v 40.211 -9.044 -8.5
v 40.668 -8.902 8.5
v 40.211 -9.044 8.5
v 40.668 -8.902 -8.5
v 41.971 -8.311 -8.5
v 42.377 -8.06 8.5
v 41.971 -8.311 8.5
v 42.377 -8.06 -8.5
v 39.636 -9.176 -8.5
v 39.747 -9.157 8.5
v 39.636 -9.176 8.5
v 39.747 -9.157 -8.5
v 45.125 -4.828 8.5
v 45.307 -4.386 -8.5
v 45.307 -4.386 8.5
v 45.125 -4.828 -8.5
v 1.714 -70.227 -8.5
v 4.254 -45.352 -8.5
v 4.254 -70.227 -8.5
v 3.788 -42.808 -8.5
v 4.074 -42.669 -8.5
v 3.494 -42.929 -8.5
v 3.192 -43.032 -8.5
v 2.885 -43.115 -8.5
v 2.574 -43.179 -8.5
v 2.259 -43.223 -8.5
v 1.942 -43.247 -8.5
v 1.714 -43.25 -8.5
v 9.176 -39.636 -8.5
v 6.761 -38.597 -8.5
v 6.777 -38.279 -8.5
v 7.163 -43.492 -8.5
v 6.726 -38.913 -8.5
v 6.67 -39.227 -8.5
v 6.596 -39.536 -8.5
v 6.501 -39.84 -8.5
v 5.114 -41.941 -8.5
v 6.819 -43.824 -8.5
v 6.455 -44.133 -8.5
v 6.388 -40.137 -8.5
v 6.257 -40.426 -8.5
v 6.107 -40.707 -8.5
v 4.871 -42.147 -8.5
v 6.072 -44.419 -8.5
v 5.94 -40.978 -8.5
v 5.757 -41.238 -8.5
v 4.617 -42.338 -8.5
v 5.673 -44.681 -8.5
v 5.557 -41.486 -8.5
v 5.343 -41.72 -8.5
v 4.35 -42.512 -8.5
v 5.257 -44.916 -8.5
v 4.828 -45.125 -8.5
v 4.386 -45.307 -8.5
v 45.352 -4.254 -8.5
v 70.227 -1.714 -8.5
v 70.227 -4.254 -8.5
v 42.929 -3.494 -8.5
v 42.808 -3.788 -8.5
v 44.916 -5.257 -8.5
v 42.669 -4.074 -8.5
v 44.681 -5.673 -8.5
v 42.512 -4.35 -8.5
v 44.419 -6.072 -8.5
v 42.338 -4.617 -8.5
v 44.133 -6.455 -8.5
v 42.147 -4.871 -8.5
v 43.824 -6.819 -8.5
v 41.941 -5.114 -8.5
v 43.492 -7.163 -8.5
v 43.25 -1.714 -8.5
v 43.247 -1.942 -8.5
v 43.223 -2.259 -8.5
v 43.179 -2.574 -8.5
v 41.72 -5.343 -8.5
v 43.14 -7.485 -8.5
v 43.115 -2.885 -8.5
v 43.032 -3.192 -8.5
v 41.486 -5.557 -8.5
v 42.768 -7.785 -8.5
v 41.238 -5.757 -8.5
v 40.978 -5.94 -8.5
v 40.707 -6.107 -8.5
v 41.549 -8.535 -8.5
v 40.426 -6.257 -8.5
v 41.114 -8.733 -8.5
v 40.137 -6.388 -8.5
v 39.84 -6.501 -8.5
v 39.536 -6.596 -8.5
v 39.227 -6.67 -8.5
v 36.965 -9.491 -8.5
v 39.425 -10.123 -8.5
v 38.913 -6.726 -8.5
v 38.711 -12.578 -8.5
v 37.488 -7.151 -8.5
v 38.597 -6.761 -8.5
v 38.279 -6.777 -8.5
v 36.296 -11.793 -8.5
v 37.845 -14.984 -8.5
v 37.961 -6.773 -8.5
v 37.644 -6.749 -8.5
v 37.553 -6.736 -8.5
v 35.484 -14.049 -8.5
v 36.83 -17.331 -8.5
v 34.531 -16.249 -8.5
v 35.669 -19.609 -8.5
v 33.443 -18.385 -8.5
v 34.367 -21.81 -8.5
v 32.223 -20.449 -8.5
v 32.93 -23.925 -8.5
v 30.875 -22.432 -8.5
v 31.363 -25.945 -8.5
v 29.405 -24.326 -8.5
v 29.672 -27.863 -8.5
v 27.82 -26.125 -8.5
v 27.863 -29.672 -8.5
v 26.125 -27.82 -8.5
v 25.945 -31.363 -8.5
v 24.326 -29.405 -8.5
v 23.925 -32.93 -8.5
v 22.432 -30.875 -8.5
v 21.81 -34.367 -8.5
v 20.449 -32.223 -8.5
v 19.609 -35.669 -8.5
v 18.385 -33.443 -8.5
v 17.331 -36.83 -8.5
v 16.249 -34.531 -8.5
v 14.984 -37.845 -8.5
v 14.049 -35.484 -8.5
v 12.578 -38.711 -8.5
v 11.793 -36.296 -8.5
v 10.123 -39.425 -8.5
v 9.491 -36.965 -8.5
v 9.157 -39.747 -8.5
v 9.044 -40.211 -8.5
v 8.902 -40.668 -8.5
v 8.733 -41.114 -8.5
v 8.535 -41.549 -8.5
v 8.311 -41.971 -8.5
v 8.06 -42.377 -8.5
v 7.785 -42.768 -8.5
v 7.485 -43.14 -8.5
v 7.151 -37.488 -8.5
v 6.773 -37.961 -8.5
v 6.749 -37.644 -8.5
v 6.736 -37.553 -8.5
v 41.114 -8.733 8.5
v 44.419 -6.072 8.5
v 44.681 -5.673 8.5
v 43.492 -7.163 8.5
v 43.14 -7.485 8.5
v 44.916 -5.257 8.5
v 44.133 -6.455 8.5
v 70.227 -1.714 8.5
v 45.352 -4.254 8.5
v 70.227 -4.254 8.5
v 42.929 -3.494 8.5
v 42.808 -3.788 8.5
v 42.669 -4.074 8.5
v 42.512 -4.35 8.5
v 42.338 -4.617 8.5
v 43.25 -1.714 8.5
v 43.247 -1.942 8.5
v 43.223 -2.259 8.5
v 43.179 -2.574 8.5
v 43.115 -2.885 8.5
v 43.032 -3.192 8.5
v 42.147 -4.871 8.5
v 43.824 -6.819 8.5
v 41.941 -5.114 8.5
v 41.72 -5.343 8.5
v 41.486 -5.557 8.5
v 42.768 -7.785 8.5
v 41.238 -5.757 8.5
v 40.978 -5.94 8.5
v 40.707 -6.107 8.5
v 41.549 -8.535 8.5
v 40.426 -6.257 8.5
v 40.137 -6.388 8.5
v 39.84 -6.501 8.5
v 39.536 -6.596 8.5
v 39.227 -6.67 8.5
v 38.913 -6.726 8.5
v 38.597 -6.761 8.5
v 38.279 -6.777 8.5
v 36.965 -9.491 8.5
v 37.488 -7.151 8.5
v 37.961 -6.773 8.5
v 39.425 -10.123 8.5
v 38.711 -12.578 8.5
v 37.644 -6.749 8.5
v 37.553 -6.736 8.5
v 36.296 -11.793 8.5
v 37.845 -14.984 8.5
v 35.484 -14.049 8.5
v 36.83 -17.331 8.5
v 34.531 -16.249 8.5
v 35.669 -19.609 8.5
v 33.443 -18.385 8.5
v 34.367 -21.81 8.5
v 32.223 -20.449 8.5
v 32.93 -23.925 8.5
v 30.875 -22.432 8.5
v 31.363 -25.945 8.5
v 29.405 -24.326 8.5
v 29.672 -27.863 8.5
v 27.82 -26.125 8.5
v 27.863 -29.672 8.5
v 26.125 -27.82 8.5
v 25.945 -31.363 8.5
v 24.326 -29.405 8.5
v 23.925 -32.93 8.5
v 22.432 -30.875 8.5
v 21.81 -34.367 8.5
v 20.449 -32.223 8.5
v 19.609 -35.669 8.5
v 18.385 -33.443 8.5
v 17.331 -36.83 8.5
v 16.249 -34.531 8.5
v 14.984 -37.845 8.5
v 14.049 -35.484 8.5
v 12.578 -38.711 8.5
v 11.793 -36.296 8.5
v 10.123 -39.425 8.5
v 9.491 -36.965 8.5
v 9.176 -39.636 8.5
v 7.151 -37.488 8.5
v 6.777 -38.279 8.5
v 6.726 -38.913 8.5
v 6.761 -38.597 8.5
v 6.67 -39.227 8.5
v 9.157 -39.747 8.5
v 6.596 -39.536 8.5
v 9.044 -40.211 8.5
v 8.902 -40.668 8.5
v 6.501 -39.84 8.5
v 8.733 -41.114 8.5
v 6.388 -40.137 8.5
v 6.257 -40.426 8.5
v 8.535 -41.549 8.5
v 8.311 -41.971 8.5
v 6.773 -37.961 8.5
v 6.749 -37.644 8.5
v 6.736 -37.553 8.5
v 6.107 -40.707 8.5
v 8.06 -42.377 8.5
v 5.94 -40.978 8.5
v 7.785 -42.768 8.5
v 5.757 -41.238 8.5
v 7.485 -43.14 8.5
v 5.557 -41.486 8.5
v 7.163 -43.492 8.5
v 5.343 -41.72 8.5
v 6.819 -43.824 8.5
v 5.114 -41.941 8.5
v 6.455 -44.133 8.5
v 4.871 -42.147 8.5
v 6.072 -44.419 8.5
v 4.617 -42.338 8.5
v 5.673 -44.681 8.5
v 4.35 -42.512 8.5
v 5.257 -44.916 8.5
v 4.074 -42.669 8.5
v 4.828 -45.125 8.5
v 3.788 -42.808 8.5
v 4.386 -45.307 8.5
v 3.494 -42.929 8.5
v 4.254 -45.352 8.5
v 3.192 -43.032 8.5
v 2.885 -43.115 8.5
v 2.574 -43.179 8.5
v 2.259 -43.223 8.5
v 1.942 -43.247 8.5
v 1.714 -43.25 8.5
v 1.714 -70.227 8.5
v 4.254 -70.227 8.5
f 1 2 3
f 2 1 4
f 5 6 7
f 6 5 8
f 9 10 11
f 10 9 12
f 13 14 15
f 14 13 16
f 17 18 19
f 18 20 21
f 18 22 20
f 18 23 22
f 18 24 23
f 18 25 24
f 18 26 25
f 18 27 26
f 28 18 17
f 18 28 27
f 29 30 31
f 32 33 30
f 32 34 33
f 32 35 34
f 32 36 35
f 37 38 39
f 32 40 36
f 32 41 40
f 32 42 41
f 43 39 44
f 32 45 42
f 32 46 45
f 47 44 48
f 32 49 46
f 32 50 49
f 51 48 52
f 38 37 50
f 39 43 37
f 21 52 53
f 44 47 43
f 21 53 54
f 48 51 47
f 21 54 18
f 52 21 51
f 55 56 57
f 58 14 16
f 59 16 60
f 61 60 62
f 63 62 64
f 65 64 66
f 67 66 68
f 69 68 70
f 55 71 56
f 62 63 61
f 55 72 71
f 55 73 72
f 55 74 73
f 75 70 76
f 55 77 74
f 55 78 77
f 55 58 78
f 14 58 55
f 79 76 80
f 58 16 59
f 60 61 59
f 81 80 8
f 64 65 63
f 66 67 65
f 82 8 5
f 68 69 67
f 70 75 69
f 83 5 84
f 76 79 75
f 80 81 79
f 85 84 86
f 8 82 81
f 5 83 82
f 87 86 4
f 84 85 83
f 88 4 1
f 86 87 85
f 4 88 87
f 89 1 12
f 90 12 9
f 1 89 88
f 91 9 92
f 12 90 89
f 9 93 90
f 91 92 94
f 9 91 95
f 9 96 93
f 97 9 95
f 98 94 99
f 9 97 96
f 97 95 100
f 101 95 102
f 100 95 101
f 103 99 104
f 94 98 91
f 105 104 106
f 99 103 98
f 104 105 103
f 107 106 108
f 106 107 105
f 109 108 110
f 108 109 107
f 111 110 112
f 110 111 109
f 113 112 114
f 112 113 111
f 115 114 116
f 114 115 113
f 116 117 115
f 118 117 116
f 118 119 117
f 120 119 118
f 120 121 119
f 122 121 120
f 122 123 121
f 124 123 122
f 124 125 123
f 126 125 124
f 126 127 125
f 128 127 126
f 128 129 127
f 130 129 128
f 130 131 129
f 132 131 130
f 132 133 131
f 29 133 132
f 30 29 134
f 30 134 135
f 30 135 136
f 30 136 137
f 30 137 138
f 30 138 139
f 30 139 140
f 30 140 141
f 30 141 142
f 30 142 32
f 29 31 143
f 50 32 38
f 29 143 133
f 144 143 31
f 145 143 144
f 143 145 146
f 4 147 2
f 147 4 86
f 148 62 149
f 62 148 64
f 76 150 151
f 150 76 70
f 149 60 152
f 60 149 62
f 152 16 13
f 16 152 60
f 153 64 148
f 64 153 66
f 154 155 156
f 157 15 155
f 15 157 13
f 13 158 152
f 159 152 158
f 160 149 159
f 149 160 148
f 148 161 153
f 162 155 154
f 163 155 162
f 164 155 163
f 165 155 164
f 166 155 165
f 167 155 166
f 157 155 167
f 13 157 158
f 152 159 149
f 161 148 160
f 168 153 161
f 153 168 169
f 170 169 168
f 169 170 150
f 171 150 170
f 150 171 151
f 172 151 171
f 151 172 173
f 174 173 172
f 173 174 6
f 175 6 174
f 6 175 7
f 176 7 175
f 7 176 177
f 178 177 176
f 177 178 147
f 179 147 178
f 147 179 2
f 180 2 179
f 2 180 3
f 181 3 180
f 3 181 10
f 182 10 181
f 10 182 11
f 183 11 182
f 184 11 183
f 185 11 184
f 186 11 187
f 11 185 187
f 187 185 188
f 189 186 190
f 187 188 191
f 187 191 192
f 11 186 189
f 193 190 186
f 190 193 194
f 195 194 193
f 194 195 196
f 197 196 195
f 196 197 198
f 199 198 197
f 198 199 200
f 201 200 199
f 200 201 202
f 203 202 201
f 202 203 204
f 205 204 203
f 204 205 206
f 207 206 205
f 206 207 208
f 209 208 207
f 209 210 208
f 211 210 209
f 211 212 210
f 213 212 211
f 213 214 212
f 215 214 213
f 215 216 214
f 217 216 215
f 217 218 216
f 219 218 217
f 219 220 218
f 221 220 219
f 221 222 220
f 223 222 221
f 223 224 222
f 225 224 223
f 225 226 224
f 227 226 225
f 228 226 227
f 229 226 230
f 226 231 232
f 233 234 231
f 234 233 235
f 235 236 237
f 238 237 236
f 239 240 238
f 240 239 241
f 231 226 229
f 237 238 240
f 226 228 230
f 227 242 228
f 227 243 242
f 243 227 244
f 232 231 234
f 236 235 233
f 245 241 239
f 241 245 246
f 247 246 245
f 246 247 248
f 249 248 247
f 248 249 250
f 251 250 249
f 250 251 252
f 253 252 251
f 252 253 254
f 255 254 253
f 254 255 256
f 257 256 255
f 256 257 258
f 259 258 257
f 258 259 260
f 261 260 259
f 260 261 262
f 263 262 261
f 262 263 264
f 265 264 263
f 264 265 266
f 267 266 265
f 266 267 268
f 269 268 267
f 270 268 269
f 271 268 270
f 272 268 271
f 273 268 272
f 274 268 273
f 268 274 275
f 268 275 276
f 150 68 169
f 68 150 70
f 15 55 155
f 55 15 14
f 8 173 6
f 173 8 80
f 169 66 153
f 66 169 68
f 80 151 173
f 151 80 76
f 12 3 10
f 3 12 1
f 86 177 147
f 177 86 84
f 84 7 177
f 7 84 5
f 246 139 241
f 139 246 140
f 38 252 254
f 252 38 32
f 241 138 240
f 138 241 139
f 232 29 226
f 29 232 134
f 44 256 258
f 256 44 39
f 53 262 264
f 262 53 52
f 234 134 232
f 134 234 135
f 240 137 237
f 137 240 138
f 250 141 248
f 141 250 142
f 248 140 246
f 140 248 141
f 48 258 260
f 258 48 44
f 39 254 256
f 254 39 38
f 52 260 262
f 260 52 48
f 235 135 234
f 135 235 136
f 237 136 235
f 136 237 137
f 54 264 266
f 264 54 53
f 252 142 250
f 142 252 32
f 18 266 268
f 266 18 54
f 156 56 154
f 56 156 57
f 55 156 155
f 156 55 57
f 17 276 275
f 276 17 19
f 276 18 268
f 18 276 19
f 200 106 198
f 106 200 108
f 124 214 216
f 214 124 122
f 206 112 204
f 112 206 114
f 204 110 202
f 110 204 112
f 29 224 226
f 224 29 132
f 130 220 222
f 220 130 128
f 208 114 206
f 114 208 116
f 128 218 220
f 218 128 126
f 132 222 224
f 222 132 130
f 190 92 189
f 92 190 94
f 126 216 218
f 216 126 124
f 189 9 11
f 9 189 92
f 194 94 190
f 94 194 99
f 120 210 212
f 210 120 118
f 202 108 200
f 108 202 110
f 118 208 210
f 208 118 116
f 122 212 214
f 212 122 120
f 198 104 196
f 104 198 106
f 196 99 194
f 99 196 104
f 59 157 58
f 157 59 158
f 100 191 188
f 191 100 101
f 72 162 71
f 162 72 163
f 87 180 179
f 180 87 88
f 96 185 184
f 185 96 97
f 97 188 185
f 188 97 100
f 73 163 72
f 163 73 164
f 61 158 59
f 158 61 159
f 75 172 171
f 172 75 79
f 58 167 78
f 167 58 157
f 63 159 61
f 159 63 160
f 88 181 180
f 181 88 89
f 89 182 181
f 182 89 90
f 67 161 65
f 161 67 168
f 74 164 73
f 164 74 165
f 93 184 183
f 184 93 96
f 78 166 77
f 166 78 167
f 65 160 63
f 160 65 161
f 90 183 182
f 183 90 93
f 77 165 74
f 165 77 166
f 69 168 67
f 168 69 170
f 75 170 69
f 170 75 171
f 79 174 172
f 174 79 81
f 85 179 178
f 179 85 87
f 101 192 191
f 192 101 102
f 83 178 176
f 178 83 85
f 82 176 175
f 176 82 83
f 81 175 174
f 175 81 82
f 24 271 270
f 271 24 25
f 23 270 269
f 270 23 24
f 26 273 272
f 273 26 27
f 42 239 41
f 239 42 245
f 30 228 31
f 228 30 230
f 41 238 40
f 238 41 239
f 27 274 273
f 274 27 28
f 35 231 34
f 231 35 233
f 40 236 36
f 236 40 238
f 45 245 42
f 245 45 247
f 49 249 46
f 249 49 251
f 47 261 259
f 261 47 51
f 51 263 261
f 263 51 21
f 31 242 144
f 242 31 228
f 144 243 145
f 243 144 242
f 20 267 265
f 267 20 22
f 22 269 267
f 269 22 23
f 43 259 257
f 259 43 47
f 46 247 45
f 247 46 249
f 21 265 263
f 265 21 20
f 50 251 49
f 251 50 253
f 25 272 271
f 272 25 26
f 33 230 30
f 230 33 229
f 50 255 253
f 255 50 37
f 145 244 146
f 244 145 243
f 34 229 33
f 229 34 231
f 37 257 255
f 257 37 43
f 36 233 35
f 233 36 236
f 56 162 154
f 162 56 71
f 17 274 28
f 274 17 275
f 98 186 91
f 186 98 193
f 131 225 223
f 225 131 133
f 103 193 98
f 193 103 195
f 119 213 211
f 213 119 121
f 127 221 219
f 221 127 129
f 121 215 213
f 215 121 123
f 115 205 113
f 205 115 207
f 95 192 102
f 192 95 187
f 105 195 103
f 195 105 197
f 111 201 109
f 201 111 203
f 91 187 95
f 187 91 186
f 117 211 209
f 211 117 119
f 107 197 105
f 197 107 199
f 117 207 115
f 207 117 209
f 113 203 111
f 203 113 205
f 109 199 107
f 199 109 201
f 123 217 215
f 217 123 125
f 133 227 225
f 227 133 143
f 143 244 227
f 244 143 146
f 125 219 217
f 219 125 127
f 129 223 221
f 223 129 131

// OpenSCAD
//--------------------------------------------------
// Model rocket fin alignment tool generator
//
// For openSCAD 15.03-2, and Thingiverse Customizer
//
// Written by Erik Ness 2016/12/30
//
// erik@nessnation.com
//--------------------------------------------------


//--------------------------------------------------
//        User-entered parameters
//
//  Formatted for thingiverse customizer.
//
// NOTE:  I converted the inch parameters to mm
// and then turned off inches mode because the
// thingiverse customizer freaked out when I used
// inches, even though openscad works fine.
//
// NOTE2:  Thingiverse customizer also freaks out
// if you type trailing zeros, like 1.0 or 1.10,
// so don't do that!
//--------------------------------------------------

// Dimensions are inches?  (If yes, output is scaled by 25.4 in xyz)
use_inches            = 0;      // [0:No,1:Yes]

// Rocket body outside diameter:
rocket_od             = 76.2;

// Number of fins:
rocket_num_fins       = 4;  // [3:6]

// Rocket fin thickness:
rocket_fin_thick      = 3.175;

// Tool thickness:
tool_thick            = 2.54;

// Tool height:
tool_height           = 17;

// Tool fin length (extension from rocket body):
tool_fin_len          = 32;

// Glue keepout diameter:
tool_glue_keepout_dia = 10;

// Slop for rocket body dia and fin thickness:
tool_slop             = 0.127;




/* [Hidden] */
$fn = 100;

draw_fin_len          = rocket_od / 2 + tool_fin_len * 2;
fin_angle             = 360/rocket_num_fins;
delta_angle_glue      = asin(  (rocket_fin_thick/2 + tool_slop)
                             / (rocket_od/2 + tool_slop)
                            );
final_scale           = use_inches ? 25.400 : 1.000;


scale([final_scale,final_scale,final_scale])
    difference()
    {
        union()
        {
            // Tool main arc (around rocket body):
            cylinder(  tool_height
                     , d=rocket_od+tool_slop+2*tool_thick
                     , center=true
                    );

            for (a=[0 : fin_angle : 359])
            {
                rotate([0,0,a])
                    translate([rocket_od/2+tool_slop+tool_fin_len/2,0,0])
                        cube(  [  tool_fin_len
                                , rocket_fin_thick+2*tool_slop+2*tool_thick
                                , tool_height
                               ]
                             , center=true
                            );

                for (a2=[-delta_angle_glue, delta_angle_glue])
                    rotate([0,0,a+a2])
                        translate([rocket_od/2 + tool_slop, 0, 0])
                            cylinder( h=tool_height
                                     ,d=tool_glue_keepout_dia+tool_slop+2*tool_thick
                                     ,center=true
                                    );
            }
        }

        // Erase rocket body and fins:
        rocket_with_slop();
        
        // Erase extra copies of tool:
        pie_wedge(  tool_height * 1.1
                  , rocket_od+draw_fin_len
                  , 360-fin_angle
                 );
    }






// Rocket body and fins: (plus slop)
// These are subtracted from the tool:
module rocket_with_slop()
{
    // Rocket body:
    cylinder(  tool_height*1.1
             , d=rocket_od+tool_slop
             , center=true
            );

    for (a=[0 : fin_angle : 359])
    {
        // Fin:
        rotate([0,0,a])
            translate([draw_fin_len/2,0,0])
                cube(  [  draw_fin_len*1.1
                        , rocket_fin_thick+2*tool_slop
                        , tool_height*1.1
                       ]
                     , center=true
                    );
        
        // Glue keepout cylinder:
        for (a2=[-delta_angle_glue, delta_angle_glue])
            rotate([0,0,a+a2])
                translate([rocket_od/2 + tool_slop, 0, 0])
                    cylinder( h=tool_height*1.1
                             ,d=tool_glue_keepout_dia+tool_slop
                             ,center=true
                            );
    }
}





// Draws a pie wedge h units tall, r units in radius,
// starting at angle=0, going to angle=a
module pie_wedge(h,r,a)
{
    // This would work if the angle parameter was obeyed by openscad,
    // but for that you need an openscad version from 2016 or later
    // and these are currently pre-release (as of December 2016).
    //
    //    rotate_extrude(angle=a,convexity = 10)
    //        translate([r, 0, 0])
    //            square([r,h],true);
    
    
    
    // So instead, here's a really stupid "pie wedge":
    sub_angle = a/10;
    for (a2=[0 : sub_angle/2 : a*0.91])
    {
        x1 = cos(a2) * r;
        y1 = sin(a2) * r;

        x2 = cos(a2+sub_angle) * r;
        y2 = sin(a2+sub_angle) * r;
        
        linear_extrude(height=h, center=true)
            polygon(points=[[0,0],[x1,y1],[x2,y2],[0,0]]);
    }
}
